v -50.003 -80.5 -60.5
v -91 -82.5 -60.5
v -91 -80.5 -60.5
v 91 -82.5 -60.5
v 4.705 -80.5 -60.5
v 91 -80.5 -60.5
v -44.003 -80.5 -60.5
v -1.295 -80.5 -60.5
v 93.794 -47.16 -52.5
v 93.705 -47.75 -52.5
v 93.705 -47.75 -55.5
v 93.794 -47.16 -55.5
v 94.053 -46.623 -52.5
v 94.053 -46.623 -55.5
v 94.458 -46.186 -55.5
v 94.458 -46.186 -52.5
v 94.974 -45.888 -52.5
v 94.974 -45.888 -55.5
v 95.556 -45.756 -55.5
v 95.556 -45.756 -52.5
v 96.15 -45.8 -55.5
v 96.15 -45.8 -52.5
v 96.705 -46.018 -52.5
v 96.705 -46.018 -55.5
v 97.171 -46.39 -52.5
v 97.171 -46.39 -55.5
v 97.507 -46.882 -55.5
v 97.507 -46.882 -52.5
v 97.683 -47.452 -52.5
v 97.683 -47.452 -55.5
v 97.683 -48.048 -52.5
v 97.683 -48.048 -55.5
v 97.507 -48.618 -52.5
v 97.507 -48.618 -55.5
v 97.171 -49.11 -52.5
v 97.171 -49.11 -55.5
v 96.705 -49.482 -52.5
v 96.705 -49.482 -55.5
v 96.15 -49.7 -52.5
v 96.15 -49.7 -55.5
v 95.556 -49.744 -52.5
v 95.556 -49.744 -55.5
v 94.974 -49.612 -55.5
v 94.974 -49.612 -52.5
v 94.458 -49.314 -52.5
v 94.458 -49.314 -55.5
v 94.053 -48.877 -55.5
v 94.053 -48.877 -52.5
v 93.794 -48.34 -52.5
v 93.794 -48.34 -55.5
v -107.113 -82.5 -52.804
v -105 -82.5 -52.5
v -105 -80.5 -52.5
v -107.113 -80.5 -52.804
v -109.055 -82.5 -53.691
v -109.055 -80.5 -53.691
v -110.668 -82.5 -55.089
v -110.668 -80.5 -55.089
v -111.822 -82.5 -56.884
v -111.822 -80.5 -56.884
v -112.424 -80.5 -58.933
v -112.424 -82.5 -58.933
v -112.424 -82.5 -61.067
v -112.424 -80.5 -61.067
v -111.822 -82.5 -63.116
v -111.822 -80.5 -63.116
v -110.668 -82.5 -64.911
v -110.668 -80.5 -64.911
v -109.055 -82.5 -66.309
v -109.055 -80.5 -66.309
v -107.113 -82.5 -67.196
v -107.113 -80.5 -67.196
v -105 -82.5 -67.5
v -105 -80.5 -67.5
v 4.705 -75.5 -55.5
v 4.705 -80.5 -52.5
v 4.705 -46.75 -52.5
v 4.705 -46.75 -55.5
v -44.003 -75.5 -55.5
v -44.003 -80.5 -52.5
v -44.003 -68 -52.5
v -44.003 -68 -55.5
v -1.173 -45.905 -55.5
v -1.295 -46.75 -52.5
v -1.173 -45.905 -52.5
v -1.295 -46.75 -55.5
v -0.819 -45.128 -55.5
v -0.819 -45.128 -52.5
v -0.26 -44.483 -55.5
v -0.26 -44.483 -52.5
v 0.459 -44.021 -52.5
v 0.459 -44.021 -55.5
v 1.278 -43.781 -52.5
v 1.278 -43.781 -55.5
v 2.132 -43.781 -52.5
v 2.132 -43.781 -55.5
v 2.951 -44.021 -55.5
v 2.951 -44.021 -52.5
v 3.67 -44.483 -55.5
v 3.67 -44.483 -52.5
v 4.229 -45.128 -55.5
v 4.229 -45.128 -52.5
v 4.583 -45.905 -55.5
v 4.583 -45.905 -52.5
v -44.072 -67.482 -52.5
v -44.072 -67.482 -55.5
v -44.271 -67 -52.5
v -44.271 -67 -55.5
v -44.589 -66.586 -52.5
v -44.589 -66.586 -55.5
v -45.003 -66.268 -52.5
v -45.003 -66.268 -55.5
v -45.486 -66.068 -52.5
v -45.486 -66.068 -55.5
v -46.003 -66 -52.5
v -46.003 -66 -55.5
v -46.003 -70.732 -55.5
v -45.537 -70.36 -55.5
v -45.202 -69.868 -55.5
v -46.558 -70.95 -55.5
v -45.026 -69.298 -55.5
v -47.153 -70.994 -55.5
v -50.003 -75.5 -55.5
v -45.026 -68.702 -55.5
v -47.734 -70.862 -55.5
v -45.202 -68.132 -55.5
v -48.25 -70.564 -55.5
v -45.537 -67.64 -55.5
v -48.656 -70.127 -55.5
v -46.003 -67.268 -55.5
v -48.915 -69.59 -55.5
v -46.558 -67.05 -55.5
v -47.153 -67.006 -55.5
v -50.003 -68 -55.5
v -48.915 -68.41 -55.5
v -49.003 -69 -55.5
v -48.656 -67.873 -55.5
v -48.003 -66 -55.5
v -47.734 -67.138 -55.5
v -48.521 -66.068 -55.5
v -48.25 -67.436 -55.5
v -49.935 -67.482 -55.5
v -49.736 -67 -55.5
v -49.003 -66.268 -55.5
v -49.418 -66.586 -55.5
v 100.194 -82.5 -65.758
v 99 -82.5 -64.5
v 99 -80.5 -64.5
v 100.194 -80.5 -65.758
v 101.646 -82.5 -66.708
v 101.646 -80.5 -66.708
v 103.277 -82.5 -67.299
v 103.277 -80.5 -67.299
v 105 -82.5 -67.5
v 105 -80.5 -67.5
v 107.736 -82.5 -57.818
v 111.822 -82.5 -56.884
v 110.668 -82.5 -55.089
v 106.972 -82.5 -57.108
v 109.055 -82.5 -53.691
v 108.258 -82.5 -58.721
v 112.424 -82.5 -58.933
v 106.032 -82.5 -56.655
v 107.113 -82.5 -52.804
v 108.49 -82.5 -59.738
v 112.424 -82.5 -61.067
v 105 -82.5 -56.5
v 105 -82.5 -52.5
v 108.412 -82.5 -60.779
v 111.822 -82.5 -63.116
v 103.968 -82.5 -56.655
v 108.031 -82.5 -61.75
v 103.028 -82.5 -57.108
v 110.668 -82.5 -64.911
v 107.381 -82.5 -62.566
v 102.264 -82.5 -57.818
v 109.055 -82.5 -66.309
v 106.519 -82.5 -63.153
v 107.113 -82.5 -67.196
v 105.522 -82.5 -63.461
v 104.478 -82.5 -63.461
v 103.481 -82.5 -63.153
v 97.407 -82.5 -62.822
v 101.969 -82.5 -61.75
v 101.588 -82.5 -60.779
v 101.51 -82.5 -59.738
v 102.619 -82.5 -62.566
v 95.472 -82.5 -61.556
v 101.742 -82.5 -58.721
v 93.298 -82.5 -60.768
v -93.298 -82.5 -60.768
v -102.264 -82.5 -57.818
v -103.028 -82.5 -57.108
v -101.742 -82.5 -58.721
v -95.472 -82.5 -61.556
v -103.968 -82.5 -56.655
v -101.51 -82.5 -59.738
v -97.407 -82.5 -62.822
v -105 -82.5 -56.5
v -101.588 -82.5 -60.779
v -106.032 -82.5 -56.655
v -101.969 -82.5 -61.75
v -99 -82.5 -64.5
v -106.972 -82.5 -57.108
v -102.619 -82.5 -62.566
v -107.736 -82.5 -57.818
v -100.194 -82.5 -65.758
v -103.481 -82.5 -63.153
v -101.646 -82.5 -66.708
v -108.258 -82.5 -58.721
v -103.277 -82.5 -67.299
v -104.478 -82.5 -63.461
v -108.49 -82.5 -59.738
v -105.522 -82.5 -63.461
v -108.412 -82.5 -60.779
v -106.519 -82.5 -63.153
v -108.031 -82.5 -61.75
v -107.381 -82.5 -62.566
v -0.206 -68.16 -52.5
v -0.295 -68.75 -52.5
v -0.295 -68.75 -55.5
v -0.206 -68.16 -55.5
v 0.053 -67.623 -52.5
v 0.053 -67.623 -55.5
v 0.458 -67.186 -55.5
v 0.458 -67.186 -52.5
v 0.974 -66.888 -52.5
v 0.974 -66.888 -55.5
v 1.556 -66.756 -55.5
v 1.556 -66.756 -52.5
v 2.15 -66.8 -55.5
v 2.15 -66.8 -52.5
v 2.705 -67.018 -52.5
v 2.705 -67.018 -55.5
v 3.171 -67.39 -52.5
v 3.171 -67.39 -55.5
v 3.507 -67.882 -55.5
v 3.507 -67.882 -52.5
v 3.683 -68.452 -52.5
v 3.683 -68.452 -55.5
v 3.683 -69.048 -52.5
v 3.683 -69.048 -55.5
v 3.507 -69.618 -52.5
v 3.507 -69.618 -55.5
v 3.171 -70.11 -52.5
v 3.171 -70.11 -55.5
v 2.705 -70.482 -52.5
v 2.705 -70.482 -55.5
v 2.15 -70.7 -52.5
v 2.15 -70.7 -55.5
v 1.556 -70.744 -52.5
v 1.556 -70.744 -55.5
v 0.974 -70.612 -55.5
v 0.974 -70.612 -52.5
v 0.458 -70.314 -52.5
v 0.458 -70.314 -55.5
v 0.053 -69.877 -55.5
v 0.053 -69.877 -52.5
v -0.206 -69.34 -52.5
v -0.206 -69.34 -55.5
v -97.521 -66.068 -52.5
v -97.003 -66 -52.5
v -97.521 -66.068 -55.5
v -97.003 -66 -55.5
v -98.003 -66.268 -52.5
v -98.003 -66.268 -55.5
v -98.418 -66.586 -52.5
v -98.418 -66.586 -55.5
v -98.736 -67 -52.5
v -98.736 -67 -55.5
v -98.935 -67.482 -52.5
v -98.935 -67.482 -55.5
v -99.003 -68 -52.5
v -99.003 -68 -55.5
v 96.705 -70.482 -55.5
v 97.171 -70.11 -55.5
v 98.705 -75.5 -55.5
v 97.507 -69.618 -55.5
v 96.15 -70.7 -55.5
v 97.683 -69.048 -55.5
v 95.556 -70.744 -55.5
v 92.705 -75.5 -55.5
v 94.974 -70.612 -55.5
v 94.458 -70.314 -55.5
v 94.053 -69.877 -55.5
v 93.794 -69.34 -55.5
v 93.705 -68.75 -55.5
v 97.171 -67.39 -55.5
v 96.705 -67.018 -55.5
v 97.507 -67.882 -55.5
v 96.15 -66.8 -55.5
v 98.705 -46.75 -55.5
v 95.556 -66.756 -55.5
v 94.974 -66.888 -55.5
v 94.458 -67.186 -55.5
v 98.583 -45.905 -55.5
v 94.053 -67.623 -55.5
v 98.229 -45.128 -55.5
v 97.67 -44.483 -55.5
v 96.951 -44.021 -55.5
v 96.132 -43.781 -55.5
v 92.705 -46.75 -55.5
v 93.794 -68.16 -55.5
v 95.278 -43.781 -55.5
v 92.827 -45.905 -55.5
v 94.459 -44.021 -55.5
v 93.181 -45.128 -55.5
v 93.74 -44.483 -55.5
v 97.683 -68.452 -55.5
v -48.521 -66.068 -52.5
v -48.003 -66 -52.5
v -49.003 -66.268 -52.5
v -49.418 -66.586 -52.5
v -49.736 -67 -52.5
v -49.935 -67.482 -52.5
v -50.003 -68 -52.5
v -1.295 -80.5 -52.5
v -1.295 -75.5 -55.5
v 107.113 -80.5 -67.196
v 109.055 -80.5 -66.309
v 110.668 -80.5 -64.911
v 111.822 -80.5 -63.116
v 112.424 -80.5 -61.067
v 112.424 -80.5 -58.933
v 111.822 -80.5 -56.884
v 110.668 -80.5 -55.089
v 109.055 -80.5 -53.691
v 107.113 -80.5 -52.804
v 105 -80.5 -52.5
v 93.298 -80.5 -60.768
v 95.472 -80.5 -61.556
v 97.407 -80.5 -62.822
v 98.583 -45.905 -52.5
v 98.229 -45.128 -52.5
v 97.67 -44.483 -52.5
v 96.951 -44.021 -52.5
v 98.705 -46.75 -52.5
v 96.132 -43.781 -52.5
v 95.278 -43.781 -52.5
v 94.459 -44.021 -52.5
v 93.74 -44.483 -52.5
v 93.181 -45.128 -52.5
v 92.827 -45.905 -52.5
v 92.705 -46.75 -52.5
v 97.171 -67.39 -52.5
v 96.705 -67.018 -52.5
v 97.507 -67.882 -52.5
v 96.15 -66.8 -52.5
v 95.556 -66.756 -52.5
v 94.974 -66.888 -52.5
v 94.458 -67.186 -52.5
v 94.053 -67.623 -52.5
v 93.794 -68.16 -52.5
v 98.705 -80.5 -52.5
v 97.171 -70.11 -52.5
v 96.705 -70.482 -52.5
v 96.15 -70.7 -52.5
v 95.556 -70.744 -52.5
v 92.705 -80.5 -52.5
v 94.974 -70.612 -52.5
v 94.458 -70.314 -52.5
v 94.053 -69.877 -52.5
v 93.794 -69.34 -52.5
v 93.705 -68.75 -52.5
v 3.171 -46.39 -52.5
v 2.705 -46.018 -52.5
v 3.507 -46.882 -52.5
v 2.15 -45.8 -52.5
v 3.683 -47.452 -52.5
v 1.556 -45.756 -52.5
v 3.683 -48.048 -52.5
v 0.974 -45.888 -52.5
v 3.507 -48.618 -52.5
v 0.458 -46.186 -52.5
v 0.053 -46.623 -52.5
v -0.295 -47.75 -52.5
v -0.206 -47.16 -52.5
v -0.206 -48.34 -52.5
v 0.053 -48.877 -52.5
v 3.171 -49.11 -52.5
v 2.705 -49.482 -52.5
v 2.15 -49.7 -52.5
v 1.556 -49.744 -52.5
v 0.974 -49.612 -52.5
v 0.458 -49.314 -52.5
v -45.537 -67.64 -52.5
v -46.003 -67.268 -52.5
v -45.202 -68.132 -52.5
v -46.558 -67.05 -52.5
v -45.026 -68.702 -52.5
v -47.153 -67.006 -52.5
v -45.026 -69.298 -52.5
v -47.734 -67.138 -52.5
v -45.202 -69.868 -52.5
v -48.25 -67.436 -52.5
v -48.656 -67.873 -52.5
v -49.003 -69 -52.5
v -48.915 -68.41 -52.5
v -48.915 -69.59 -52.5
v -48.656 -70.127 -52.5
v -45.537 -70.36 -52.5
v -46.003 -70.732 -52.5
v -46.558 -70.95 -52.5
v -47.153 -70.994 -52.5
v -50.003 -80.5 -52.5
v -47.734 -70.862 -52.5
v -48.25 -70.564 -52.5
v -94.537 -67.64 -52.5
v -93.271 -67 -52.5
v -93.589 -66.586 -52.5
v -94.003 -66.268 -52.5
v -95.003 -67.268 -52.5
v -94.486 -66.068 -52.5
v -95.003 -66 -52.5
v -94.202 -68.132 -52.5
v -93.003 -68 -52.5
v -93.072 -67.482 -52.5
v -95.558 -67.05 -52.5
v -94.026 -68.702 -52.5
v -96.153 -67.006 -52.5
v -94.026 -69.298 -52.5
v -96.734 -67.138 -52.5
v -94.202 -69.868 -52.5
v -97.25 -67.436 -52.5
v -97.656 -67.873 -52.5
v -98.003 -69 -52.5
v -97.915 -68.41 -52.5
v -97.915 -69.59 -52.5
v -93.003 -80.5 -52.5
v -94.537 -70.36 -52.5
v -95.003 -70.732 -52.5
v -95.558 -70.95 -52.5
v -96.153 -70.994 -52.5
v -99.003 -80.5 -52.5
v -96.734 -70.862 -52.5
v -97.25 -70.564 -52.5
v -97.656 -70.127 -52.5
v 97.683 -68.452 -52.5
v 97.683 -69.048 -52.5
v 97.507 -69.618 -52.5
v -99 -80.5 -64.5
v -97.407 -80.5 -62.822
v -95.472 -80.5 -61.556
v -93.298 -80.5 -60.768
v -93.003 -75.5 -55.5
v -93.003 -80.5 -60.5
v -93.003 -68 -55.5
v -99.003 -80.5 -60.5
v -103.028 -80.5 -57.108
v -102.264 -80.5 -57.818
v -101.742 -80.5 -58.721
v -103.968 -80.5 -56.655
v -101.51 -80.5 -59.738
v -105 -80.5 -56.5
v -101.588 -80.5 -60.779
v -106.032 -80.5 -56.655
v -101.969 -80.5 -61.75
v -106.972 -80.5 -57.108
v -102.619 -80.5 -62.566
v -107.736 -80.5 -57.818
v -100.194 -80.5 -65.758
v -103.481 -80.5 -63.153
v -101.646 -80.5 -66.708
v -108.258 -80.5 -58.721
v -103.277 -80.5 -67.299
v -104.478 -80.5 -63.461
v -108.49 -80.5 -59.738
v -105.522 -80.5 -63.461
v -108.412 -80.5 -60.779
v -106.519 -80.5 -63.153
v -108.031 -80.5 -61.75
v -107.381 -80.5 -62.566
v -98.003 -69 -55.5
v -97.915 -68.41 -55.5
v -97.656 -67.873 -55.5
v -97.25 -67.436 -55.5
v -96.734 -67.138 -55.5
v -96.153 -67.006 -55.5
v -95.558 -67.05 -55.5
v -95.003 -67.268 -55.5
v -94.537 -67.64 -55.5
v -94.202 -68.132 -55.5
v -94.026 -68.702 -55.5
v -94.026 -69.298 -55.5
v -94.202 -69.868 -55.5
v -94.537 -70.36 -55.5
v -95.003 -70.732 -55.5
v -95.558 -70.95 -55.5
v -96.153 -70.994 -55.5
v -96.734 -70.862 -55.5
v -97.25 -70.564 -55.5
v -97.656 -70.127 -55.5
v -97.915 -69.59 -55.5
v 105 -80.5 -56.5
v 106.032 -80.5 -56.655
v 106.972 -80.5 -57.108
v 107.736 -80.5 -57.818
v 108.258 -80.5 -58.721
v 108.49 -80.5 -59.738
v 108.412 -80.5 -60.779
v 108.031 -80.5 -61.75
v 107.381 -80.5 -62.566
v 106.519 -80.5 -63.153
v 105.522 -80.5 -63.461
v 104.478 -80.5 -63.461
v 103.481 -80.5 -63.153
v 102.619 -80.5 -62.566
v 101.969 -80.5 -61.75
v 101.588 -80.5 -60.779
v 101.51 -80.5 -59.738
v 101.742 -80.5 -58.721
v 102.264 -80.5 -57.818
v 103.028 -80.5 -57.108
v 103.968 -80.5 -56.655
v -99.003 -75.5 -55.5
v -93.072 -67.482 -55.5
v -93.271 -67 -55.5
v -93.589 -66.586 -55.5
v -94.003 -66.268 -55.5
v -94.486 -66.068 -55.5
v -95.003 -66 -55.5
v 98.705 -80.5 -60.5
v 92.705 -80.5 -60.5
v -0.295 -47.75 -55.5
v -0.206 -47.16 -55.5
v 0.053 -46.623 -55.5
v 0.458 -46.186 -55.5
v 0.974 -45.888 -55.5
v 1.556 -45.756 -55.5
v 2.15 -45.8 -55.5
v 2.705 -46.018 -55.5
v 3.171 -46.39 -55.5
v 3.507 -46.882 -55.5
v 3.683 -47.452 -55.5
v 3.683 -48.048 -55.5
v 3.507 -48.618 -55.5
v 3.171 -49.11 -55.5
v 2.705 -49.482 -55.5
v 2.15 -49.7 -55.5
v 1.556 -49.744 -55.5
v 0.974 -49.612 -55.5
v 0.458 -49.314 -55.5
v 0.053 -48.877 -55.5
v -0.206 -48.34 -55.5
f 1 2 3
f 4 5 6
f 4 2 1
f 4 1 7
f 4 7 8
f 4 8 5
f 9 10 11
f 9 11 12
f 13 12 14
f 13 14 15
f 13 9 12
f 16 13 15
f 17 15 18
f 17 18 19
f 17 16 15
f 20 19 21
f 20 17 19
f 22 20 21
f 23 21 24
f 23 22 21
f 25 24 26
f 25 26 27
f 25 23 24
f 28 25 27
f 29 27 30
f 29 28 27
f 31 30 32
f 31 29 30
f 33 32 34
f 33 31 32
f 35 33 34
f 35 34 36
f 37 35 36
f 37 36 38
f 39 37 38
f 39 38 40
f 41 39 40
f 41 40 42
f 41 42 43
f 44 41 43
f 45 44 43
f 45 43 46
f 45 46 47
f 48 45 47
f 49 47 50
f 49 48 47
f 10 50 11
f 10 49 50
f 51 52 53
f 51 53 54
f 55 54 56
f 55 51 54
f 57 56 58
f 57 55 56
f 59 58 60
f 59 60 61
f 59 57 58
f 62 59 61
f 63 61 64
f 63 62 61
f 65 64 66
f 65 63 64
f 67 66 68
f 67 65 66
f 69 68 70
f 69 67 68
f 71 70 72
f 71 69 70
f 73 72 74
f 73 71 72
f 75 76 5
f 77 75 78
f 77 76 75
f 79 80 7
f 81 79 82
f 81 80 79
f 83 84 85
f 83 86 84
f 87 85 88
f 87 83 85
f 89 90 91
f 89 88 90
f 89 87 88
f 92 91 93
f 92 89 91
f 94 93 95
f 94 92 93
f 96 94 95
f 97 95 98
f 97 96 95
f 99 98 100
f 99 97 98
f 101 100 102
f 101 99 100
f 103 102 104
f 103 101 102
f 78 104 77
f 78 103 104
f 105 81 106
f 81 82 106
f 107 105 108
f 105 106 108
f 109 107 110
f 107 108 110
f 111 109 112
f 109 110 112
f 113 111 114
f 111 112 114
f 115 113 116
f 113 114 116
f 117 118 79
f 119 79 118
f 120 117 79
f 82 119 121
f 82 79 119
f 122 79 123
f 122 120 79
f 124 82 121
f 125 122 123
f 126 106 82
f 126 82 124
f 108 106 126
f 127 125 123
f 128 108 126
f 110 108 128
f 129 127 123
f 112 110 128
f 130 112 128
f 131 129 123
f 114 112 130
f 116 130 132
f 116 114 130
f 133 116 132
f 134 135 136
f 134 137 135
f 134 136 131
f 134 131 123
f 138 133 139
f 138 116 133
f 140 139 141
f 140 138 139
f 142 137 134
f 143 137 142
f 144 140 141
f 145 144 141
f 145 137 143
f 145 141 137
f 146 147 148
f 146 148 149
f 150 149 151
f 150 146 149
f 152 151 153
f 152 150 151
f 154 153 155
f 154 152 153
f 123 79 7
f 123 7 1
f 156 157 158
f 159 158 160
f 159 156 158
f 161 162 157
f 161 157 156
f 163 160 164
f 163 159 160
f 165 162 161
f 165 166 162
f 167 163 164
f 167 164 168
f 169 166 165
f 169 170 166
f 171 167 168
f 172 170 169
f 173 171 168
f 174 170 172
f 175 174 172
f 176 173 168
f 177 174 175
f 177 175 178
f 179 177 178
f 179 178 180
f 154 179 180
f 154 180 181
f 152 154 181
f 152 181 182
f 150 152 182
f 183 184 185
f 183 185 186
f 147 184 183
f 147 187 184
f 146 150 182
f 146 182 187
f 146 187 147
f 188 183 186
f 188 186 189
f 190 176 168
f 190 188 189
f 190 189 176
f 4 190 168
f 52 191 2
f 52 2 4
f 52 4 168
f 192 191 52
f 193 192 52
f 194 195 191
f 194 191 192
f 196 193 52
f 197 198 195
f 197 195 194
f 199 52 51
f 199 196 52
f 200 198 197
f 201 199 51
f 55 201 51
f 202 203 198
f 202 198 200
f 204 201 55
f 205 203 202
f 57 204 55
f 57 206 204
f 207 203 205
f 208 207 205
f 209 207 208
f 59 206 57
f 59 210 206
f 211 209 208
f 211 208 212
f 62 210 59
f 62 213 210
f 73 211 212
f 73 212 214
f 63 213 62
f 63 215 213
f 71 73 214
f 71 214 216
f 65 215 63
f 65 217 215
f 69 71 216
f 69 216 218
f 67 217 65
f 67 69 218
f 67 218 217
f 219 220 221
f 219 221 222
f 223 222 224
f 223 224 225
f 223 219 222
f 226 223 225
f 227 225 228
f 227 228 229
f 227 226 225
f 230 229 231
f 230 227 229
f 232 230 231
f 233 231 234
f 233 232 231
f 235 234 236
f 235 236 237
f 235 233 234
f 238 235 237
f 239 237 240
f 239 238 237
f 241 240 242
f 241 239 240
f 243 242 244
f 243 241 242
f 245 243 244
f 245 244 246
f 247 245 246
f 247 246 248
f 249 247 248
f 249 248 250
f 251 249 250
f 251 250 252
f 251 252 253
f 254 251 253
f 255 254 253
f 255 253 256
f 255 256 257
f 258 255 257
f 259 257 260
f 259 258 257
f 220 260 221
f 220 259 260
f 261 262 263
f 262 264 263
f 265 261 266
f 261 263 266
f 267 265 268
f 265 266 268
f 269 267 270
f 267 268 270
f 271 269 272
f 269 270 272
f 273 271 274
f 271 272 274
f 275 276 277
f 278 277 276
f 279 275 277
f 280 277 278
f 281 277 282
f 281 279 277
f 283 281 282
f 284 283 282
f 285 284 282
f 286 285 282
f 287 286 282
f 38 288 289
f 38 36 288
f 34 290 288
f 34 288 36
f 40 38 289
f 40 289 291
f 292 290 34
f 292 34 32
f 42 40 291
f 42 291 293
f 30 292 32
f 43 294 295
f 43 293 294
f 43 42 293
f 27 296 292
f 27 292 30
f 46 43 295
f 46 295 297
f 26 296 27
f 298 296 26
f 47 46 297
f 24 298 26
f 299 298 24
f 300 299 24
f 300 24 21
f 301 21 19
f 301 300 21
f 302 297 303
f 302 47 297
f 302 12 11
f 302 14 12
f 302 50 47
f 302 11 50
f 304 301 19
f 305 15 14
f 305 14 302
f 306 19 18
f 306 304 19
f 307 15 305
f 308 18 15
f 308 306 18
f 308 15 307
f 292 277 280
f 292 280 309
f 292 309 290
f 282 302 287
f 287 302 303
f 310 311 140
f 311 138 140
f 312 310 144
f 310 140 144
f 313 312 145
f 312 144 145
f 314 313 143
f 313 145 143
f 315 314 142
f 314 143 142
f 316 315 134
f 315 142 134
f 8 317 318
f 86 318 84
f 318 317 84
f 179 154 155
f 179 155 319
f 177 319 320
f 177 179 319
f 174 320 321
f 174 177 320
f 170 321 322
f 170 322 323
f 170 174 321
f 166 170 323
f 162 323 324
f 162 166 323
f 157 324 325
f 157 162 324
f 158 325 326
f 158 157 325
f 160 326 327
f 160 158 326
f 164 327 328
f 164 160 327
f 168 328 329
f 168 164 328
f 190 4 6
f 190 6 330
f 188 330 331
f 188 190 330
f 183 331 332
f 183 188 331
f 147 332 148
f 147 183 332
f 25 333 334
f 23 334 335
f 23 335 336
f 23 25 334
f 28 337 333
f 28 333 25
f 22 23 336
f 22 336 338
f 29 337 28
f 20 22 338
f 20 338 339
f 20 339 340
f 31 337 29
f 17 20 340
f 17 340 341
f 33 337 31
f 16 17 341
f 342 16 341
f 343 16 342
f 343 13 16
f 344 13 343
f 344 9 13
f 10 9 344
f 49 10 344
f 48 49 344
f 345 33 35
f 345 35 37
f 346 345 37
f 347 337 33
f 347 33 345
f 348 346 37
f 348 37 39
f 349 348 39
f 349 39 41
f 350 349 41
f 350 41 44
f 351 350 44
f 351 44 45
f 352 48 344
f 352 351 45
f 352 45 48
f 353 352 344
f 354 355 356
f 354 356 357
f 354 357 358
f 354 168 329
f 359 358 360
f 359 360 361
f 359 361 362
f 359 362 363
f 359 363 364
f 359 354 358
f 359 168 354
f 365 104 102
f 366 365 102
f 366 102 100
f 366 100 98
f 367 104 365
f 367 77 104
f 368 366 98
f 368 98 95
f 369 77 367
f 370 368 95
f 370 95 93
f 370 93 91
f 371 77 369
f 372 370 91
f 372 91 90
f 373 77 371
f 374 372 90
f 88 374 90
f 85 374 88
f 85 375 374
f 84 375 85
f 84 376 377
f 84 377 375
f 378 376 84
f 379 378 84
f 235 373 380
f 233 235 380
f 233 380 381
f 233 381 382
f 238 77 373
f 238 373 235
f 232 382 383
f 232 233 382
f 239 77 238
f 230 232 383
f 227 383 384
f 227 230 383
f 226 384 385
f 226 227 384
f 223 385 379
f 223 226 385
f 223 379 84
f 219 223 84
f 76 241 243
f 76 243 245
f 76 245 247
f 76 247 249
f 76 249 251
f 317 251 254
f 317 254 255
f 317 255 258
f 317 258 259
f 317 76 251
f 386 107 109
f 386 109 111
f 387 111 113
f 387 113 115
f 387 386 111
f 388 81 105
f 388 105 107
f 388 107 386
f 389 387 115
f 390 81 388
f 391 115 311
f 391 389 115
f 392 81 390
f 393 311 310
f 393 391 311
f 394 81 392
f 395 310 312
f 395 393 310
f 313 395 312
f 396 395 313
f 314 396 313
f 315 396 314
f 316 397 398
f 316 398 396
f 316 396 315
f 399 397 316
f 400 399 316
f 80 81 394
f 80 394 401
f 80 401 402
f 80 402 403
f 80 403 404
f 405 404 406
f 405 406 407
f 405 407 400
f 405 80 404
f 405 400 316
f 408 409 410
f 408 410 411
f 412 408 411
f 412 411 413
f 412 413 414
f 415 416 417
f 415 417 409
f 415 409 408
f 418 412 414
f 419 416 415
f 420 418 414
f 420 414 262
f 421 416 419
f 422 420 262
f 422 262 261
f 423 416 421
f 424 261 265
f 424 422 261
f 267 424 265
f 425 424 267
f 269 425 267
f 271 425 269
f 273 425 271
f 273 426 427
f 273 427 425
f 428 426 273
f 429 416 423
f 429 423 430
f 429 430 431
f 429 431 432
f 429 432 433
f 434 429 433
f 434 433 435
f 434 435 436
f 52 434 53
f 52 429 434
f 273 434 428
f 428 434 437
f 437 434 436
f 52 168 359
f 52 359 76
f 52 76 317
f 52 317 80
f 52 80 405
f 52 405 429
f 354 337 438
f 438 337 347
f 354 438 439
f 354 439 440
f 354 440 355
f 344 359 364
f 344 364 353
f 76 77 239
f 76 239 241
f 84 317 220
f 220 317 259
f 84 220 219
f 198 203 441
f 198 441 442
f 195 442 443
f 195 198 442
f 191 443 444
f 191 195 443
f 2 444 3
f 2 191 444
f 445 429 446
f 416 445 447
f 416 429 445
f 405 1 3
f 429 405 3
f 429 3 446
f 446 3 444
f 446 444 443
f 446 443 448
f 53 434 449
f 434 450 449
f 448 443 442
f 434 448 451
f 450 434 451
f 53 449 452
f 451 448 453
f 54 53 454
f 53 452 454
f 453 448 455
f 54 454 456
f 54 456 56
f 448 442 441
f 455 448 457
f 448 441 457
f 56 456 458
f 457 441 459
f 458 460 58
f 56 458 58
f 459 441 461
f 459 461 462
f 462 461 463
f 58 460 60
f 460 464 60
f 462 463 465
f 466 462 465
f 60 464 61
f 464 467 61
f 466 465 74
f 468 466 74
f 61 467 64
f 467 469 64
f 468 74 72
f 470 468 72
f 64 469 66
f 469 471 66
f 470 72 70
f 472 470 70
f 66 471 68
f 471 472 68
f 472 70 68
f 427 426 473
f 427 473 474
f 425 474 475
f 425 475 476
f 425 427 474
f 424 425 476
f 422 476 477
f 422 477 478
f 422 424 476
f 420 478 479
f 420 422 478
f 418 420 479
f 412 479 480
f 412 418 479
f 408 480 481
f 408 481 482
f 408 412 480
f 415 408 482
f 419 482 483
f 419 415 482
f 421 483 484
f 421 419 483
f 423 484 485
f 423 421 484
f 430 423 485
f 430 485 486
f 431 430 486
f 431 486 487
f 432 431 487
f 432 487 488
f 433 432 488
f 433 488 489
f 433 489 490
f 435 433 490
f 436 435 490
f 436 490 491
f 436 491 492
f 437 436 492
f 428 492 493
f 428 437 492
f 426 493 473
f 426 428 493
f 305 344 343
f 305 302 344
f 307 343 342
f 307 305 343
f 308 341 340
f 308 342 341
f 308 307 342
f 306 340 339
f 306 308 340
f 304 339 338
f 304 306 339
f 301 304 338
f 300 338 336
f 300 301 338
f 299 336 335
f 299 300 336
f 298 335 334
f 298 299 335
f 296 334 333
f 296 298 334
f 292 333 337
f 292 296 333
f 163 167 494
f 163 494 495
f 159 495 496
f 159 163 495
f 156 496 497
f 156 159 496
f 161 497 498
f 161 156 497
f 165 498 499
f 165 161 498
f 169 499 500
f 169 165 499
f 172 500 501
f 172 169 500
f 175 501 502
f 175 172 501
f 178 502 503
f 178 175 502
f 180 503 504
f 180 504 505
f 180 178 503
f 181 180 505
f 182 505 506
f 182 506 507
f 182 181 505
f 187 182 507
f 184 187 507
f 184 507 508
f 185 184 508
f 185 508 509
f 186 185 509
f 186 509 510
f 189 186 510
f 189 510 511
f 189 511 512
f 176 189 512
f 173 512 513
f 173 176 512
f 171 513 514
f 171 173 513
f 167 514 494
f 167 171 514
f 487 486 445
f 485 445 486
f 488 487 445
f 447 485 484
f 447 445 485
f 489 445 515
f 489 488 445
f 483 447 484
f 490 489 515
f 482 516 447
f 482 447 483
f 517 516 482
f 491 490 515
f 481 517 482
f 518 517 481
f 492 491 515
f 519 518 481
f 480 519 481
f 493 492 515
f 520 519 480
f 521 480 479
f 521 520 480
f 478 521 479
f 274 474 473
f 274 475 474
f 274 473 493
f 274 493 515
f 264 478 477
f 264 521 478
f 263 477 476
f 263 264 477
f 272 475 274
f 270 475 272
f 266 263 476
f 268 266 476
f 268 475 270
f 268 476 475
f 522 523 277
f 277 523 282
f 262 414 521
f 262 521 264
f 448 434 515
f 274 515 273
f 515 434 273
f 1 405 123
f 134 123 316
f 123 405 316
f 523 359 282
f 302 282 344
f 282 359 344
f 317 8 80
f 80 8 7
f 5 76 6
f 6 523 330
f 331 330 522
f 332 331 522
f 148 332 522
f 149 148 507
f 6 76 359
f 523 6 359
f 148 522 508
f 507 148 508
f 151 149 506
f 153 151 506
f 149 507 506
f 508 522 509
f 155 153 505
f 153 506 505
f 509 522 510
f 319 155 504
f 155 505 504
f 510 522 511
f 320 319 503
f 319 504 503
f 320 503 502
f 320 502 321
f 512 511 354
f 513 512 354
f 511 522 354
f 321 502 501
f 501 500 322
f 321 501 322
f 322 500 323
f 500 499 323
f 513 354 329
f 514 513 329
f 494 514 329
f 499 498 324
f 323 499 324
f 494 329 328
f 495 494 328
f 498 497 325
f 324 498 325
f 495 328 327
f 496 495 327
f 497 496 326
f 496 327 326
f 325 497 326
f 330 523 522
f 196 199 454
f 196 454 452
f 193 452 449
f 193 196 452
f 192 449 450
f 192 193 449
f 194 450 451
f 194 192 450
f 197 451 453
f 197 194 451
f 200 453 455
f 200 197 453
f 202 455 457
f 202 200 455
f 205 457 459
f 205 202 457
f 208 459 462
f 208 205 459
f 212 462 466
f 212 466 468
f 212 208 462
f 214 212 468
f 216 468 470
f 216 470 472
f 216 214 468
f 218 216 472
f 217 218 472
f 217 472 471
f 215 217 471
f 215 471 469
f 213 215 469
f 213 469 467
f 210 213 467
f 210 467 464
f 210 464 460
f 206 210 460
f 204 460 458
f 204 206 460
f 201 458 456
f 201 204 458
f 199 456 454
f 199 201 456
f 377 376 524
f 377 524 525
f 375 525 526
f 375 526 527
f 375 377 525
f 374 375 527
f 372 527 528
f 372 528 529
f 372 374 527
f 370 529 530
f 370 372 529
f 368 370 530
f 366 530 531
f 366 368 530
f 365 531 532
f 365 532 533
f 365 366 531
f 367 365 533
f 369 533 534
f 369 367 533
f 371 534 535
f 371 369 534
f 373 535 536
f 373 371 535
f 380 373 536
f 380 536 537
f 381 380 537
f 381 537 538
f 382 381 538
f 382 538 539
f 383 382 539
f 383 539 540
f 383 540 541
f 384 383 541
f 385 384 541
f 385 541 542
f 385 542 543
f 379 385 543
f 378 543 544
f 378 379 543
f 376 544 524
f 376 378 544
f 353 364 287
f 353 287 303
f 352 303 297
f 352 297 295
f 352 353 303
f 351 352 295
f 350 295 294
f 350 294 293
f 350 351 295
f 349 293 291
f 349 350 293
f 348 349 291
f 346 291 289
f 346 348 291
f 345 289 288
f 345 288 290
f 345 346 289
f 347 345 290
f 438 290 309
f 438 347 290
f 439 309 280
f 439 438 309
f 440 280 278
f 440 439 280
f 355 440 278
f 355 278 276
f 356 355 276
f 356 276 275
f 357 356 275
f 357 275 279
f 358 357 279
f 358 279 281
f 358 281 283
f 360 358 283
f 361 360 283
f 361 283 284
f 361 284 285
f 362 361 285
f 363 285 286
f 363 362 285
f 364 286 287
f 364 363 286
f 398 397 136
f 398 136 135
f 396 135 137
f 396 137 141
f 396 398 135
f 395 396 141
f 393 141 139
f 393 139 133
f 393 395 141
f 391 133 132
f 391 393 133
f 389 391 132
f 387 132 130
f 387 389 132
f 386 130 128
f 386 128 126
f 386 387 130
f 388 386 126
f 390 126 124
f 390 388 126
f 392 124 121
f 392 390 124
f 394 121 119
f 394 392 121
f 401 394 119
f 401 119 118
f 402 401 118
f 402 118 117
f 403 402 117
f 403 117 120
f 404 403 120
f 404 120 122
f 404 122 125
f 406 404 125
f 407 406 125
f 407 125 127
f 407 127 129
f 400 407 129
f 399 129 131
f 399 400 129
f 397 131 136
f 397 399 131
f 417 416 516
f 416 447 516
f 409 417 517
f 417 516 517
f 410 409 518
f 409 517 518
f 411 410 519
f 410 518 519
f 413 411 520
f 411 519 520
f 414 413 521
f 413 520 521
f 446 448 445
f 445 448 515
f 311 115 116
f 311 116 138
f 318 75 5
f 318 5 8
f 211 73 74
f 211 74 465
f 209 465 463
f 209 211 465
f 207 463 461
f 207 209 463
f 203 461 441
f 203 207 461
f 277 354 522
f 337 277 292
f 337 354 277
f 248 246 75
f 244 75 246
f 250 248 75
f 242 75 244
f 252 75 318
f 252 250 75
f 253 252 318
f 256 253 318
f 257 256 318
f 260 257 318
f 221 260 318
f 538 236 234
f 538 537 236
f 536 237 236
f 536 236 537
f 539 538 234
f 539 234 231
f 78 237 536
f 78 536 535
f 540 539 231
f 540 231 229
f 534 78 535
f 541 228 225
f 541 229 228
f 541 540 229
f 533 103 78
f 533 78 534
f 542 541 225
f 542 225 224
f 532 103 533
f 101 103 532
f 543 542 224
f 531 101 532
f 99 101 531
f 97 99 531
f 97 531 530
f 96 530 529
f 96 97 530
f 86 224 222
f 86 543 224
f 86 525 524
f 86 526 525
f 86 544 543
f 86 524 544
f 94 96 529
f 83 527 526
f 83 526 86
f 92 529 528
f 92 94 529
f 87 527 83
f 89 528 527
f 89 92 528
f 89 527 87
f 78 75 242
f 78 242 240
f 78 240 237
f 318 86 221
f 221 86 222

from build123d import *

# Parameters (mm, degrees)
SKETCH1_R           = 3.5
BOSS_EXTRUDE1_DEPTH = 2
SKETCH2_W           = 6
SKETCH2_H           = 36.75
SKETCH2_R           = 2
SKETCH2_H_2         = 14.5
BOSS_EXTRUDE2_DEPTH = 3
FILLET1_RADIUS      = 3
FILLET1_LENGTH      = 3
FILLET2_RADIUS      = 3
FILLET2_LENGTH      = 3
FILLET3_R           = 2
CHAMFER1_SIZE       = 5
CUT_EXTRUDE1_START  = -10
CUT_EXTRUDE1_DEPTH  = 10
FILLET4_R           = 10


with BuildPart() as part:
    # Sketch1 → Boss-Extrude1 (new body)
    with BuildSketch(Plane(origin=(0, -82.5, 0), x_dir=(1, 0, 0), z_dir=(0, 1, 0))):
        with BuildLine():
            Line((-105, 67.5), (105, 67.5))
            ThreePointArc((105, 67.5), (112.5, 60), (105, 52.5))
            Line((105, 52.5), (-105, 52.5))
            ThreePointArc((-105, 52.5), (-112.5, 60), (-105, 67.5))
        make_face()
        with Locations(Location((-105, 60, 0), (0, 0, 270))):
            Circle(SKETCH1_R, mode=Mode.SUBTRACT)
        with Locations(Location((105, 60, 0), (0, 0, 270))):
            Circle(SKETCH1_R, mode=Mode.SUBTRACT)
    extrude(amount=BOSS_EXTRUDE1_DEPTH)

    # Sketch2 → Boss-Extrude2 (add)
    # profile 1 of 4: a face of its own
    with BuildSketch(Plane(origin=(0, 0, -52.5), x_dir=(-1, 0, 0), z_dir=(0, 0, -1))):
        with Locations((-95.704993888, -62.125)):
            Rectangle(SKETCH2_W, SKETCH2_H)
        with Locations((-95.704993888, -47.75)):
            Circle(SKETCH2_R, mode=Mode.SUBTRACT)
        with Locations((-95.704993888, -68.75)):
            Circle(SKETCH2_R, mode=Mode.SUBTRACT)
    # profile 2 of 4: a face of its own
    with BuildSketch(Plane(origin=(0, 0, -52.5), x_dir=(-1, 0, 0), z_dir=(0, 0, -1))):
        with Locations((-1.704993888, -62.125)):
            Rectangle(SKETCH2_W, SKETCH2_H)
        with Locations((-1.704993888, -47.75)):
            Circle(SKETCH2_R, mode=Mode.SUBTRACT)
        with Locations((-1.704993888, -68.75)):
            Circle(SKETCH2_R, mode=Mode.SUBTRACT)
    # profile 3 of 4: a face of its own
    with BuildSketch(Plane(origin=(0, 0, -52.5), x_dir=(-1, 0, 0), z_dir=(0, 0, -1))):
        with Locations((47.003472144, -73.25)):
            Rectangle(SKETCH2_W, SKETCH2_H_2)
        with Locations((47.003472144, -69)):
            Circle(SKETCH2_R, mode=Mode.SUBTRACT)
    # profile 4 of 4: a face of its own
    with BuildSketch(Plane(origin=(0, 0, -52.5), x_dir=(-1, 0, 0), z_dir=(0, 0, -1))):
        with Locations((96.003472144, -73.25)):
            Rectangle(SKETCH2_W, SKETCH2_H_2)
        with Locations((96.003472144, -69)):
            Circle(SKETCH2_R, mode=Mode.SUBTRACT)
    extrude(amount=BOSS_EXTRUDE2_DEPTH)

    # Fillet1: full round fillet: the end face becomes a half cylinder, R = half its width
    fillet1_face = Plane((95.704993888, -43.75, -54), x_dir=(0, 0, -1), z_dir=(0, 1, 0))  # on the end face: x along it, z out of the body
    fillet1_slab = fillet1_face.offset(-FILLET1_RADIUS / 2) * Box(FILLET1_LENGTH, 2 * FILLET1_RADIUS, FILLET1_RADIUS, mode=Mode.PRIVATE)  # the body's end, R deep
    fillet1_round = Plane((95.704993888, -46.75, -54), x_dir=(0, 1, 0), z_dir=(0, 0, -1)) * Cylinder(FILLET1_RADIUS, FILLET1_LENGTH, mode=Mode.PRIVATE)  # its axis R under the face
    add(fillet1_slab - fillet1_round, mode=Mode.SUBTRACT)

    # Fillet2: full round fillet: the end face becomes a half cylinder, R = half its width
    fillet2_face = Plane((1.704993888, -43.75, -54), x_dir=(0, 0, -1), z_dir=(0, 1, 0))  # on the end face: x along it, z out of the body
    fillet2_slab = fillet2_face.offset(-FILLET2_RADIUS / 2) * Box(FILLET2_LENGTH, 2 * FILLET2_RADIUS, FILLET2_RADIUS, mode=Mode.PRIVATE)  # the body's end, R deep
    fillet2_round = Plane((1.704993888, -46.75, -54), x_dir=(0, 1, 0), z_dir=(0, 0, -1)) * Cylinder(FILLET2_RADIUS, FILLET2_LENGTH, mode=Mode.PRIVATE)  # its axis R under the face
    add(fillet2_slab - fillet2_round, mode=Mode.SUBTRACT)

    # Fillet3
    fillet3_edges = [part.edges().sort_by_distance(p)[0] for p in [
        (-44.003472144, -66, -54),
        (-50.003472144, -66, -54),
        (-99.003472144, -66, -54),
        (-93.003472144, -66, -54),
    ]]
    fillet(fillet3_edges, radius=FILLET3_R)

    # Chamfer1
    chamfer1_edges = [part.edges().sort_by_distance(p)[0] for p in [
        (95.704993888, -80.5, -55.5),
        (1.704993888, -80.5, -55.5),
        (-47.003472144, -80.5, -55.5),
        (-96.003472144, -80.5, -55.5),
    ]]
    chamfer(chamfer1_edges, length=CHAMFER1_SIZE)

    # Sketch3 → Cut-Extrude1 (cut)
    with BuildSketch(Plane(origin=(0, -80.5, 0), x_dir=(1, 0, 0), z_dir=(0, 1, 0)).offset(CUT_EXTRUDE1_START)):
        with BuildLine():
            Line((92.704993888, 60.5), (97.516685226, 60.5))
            ThreePointArc((97.516685226, 60.5), (99.876524617, 65.477225575), (105, 67.5))
            Line((105, 67.5), (-105, 67.5))
            ThreePointArc((-105, 67.5), (-99.876524617, 65.477225575), (-97.516685226, 60.5))
            Line((-97.516685226, 60.5), (-93.003472144, 60.5))
            Line((-93.003472144, 60.5), (-50.003472144, 60.5))
            Line((-50.003472144, 60.5), (-44.003472144, 60.5))
            Line((-44.003472144, 60.5), (-1.295006112, 60.5))
            Line((-1.295006112, 60.5), (4.704993888, 60.5))
            Line((4.704993888, 60.5), (92.704993888, 60.5))
        make_face()
    extrude(amount=CUT_EXTRUDE1_DEPTH, mode=Mode.SUBTRACT)

    # Fillet4
    # the kernel refuses this fillet: 10 mm, written as the material it adds along each edge
    with BuildSketch(Plane(origin=(97.516685226, -82.5, -60.5), x_dir=(-1, 0, 0), z_dir=(0, 1, 0))) as fillet4_piece_1_section:
        with BuildLine():
            CenterArc((6.516685226, -10), FILLET4_R, 90, 53.130102354)
            ThreePointArc((-1.483314774, -4), (-0.451249336, -2.107691638), (0, 0))
            Line((0, 0), (6.516685226, 0))
        make_face()
    fillet4_piece_1 = extrude(amount=2, mode=Mode.PRIVATE)
    fillet4_piece_1 = split(fillet4_piece_1, bisect_by=Plane(origin=(95.39414114, -81.261061564, -61.261061564), z_dir=(0, -0.7071067811865476, 0.7071067811865476)), keep=Keep.TOP, mode=Mode.PRIVATE)
    add(fillet4_piece_1)
    with BuildSketch(Plane(origin=(97.516685226, -82.5, -60.5), x_dir=(-1, 0, 0), z_dir=(0, 1, 0))) as fillet4_piece_2_section:
        with BuildLine():
            CenterArc((6.516685226, -10), FILLET4_R, 90, 53.130102354)
            ThreePointArc((-1.483314774, -4), (-0.451249336, -2.107691638), (0, 0))
            Line((0, 0), (6.516685226, 0))
        make_face()
    fillet4_piece_2 = extrude(amount=2, mode=Mode.PRIVATE)
    fillet4_piece_2 = split(fillet4_piece_2, bisect_by=Plane(origin=(97.181808866, -81.694028368, -61.694028368), z_dir=(0, 0.7071067811865476, -0.7071067811865476)), keep=Keep.TOP, mode=Mode.PRIVATE)
    add(fillet4_piece_2)
    with BuildSketch(Plane(origin=(-97.516685226, -82.5, -60.5), x_dir=(1, 0, 0), z_dir=(0, 1, 0))) as fillet4_piece_3_section:
        with BuildLine():
            CenterArc((6.516685226, 10), FILLET4_R, 216.869897646, 53.130102354)
            ThreePointArc((-1.483314774, 4), (-0.451249336, 2.107691638), (0, 0))
            Line((0, 0), (6.516685226, 0))
        make_face()
    fillet4_piece_3 = extrude(amount=2, mode=Mode.PRIVATE)
    fillet4_piece_3 = split(fillet4_piece_3, bisect_by=Plane(origin=(-95.39414114, -81.261061564, -61.261061564), z_dir=(0, -0.7071067811865476, 0.7071067811865476)), keep=Keep.TOP, mode=Mode.PRIVATE)
    add(fillet4_piece_3)
    with BuildSketch(Plane(origin=(-97.516685226, -82.5, -60.5), x_dir=(1, 0, 0), z_dir=(0, 1, 0))) as fillet4_piece_4_section:
        with BuildLine():
            CenterArc((6.516685226, 10), FILLET4_R, 216.869897646, 53.130102354)
            ThreePointArc((-1.483314774, 4), (-0.451249336, 2.107691638), (0, 0))
            Line((0, 0), (6.516685226, 0))
        make_face()
    fillet4_piece_4 = extrude(amount=2, mode=Mode.PRIVATE)
    fillet4_piece_4 = split(fillet4_piece_4, bisect_by=Plane(origin=(-97.181808866, -81.694028368, -61.694028368), z_dir=(0, 0.7071067811865476, -0.7071067811865476)), keep=Keep.TOP, mode=Mode.PRIVATE)
    add(fillet4_piece_4)


solid = part.part
